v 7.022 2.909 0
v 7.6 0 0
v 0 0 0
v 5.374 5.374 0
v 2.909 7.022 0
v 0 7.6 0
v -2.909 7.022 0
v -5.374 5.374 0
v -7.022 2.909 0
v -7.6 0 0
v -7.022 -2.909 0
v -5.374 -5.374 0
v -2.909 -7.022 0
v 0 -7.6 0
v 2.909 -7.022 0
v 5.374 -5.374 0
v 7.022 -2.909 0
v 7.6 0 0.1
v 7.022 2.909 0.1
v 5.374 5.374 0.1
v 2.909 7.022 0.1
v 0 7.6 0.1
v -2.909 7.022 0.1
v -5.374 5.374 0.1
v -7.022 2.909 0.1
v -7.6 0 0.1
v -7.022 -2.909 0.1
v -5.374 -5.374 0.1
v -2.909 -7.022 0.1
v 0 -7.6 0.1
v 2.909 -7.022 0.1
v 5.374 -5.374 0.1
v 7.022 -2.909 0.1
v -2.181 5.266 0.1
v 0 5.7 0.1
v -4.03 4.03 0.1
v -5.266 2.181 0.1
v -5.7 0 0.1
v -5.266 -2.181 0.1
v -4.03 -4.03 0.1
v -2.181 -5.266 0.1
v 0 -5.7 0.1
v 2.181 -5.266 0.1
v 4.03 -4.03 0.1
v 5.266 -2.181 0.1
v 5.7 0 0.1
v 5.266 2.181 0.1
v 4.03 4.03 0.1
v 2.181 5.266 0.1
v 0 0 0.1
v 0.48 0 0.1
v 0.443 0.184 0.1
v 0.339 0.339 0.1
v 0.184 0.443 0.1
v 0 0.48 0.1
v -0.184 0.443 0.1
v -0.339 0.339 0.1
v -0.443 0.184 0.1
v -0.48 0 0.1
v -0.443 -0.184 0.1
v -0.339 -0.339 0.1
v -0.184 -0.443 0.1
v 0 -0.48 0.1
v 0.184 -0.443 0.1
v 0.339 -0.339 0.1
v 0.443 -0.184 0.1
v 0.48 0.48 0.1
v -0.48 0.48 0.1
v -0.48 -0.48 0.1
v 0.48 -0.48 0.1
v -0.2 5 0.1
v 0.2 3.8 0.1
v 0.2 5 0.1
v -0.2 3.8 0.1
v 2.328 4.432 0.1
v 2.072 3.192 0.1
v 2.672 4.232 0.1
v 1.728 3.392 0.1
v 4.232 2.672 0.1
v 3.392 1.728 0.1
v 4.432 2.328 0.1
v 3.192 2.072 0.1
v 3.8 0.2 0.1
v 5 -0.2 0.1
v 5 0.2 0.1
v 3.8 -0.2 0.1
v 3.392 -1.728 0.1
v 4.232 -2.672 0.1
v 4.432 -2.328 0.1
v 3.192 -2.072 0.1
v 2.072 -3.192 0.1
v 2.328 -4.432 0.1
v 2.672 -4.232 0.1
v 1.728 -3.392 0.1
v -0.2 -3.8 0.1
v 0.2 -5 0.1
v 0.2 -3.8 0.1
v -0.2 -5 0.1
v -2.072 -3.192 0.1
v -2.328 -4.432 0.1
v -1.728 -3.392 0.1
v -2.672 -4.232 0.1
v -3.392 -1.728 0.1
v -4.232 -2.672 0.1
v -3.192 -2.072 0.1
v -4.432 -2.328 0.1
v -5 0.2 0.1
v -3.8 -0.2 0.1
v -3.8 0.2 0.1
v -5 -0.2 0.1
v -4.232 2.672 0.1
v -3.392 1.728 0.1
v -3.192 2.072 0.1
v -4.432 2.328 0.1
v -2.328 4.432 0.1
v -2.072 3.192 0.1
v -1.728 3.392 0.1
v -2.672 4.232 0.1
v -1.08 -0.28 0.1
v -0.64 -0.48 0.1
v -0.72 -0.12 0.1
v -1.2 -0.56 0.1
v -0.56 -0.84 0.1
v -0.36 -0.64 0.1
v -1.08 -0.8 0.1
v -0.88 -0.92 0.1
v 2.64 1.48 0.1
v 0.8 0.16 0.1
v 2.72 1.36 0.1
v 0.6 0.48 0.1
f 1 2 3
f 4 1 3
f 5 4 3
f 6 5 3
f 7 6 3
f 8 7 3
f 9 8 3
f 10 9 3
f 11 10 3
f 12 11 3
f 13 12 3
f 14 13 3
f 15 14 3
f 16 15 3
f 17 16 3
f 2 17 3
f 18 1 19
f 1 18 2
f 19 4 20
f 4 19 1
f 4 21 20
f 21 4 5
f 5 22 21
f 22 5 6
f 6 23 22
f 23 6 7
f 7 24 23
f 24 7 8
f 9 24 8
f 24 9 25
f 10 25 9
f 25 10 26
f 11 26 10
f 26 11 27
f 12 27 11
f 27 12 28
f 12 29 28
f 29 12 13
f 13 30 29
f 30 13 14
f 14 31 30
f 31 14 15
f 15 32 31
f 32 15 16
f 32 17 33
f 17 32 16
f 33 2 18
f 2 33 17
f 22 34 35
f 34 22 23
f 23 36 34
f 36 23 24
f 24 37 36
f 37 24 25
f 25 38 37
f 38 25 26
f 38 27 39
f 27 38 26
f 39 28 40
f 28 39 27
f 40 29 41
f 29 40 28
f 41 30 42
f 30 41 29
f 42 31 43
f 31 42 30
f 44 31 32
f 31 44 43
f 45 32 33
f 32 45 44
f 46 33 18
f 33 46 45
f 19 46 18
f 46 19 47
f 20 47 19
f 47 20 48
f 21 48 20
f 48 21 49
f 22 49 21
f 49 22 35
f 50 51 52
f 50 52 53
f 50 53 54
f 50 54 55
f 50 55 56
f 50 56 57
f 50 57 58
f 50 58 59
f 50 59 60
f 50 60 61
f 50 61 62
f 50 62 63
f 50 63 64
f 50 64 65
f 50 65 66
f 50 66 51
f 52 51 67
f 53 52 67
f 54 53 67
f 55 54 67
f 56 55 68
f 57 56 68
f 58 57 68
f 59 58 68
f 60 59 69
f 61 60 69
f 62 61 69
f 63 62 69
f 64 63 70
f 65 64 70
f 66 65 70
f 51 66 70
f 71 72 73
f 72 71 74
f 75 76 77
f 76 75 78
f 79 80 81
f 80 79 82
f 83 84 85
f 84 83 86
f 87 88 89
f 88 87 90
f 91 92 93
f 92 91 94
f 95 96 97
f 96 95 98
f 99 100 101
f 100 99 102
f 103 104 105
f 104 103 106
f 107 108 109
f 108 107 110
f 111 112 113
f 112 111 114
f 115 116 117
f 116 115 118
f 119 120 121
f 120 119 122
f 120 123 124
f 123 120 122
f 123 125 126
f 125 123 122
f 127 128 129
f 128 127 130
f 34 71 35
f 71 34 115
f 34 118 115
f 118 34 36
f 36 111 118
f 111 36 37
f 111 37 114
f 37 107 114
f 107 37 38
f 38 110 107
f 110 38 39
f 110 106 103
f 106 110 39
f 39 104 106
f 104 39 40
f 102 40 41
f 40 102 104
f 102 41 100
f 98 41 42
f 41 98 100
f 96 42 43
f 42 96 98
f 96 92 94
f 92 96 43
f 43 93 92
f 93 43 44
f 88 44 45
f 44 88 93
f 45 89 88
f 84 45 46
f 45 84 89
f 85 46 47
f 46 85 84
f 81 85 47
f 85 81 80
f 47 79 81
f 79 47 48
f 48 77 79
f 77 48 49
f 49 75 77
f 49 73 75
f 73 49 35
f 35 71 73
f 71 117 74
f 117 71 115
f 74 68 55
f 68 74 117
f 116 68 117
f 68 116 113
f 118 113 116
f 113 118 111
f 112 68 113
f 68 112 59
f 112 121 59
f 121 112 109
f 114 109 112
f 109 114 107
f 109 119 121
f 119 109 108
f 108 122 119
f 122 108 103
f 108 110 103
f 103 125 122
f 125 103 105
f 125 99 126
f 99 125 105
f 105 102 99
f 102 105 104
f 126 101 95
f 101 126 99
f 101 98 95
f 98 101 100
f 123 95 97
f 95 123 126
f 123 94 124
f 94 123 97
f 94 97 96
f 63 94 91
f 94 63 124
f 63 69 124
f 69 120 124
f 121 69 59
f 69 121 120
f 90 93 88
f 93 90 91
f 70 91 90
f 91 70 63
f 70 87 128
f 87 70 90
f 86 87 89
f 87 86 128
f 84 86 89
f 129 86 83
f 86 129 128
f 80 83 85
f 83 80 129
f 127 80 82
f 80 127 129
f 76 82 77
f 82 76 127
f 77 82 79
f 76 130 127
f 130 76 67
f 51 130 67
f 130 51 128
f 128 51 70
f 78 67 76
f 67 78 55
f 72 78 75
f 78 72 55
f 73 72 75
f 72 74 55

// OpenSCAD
// file: ../p/empty.scad
use <../lib.scad>
function ldraw_lib__empty() = [
// 0 Empty
// 0 Name: empty.dat
// 0 Author: Steffen [Steffen]
// 0 !LDRAW_ORG Primitive UPDATE 2015-01
// 0 !LICENSE Licensed under CC BY 4.0 : see CAreadme.txt
// 
// 0 BFC CERTIFY CCW
  [0,"BFC","CERTIFY"],
  [0,"BFC","CCW"],
// 
// 0 !HISTORY 2015-10-11 [PTadmin] Official Update 2015-01
// 
// 
// 0 // Tool MLCad cannot handle really empty files. This file is used as a workaround.
// 0 // It exceptionally contains forbidden non-LDRAW standard syntax to satisfy MLCad until it is fixed OR a different editor has become the de-facto LDRAW standard.
// 0 // The line being used here is an "impossible" conditional line which never should be visible,
// 0 // additionally hidden by a syntax explicitly hiding it from displaying.
// 
// 0 MLCAD HIDE 5 24 0 0 0 0.0001 0 0 0.0001 -0.0001 0 0 0 0
];
module ldraw_lib__empty(step=0, col=false, unit=2/5, alt=false, line=0.2, solid=!$preview)
    makepoly(ldraw_lib__empty(), step=step, col=col, unit=unit, alt=alt, line=line, solid=solid);
ldraw_lib__empty(line=0.2);
// file: ../p/1-16chrd.scad
use <../lib.scad>
use <empty.scad>
function ldraw_lib__1_16chrd() = [
// 0 Chord 0.0625
// 0 Name: 1-16chrd.dat
// 0 Author: Philippe Hurbain [Philo]
// 0 !LDRAW_ORG Primitive UPDATE 2015-01
// 0 !LICENSE Licensed under CC BY 4.0 : see CAreadme.txt
// 
// 0 BFC CERTIFY CCW
  [0,"BFC","CERTIFY"],
  [0,"BFC","CCW"],
// 
// 0 !HISTORY 2015-10-11 [PTadmin] Official Update 2015-01
// 
// 
// 0 // This file is intentionally empty because at the current \P resolution,
// 0 // an 1-16chrd is actually empty. However, this file still is present
// 0 // to allow tools to do primitives substition and fill in a real chrd here,
// 0 // or, if desired, to substitute this with the hi-res 48\1-16chrd.
// 
// 0 // This file is based on an idea by Darats at http://forums.ldraw.org/read.php?19,14500,14500#msg-14500
// 
// 1 16 0 0 0 1 0 0 0 1 0 0 0 1 empty.dat
  [1,16,0,0,0,1,0,0,0,1,0,0,0,1, ldraw_lib__empty()],
];
module ldraw_lib__1_16chrd(step=0, col=false, unit=2/5, alt=false, line=0.2, solid=!$preview)
    makepoly(ldraw_lib__1_16chrd(), step=step, col=col, unit=unit, alt=alt, line=line, solid=solid);
ldraw_lib__1_16chrd(line=0.2);
// file: ../p/4-4cyli.scad
use <../lib.scad>
function ldraw_lib__4_4cyli() = [
// 0 Cylinder 1.0
// 0 Name: 4-4cyli.dat
// 0 Author: James Jessiman
// 0 !LDRAW_ORG Primitive UPDATE 2005-01
// 0 !LICENSE Licensed under CC BY 4.0 : see CAreadme.txt
// 
// 0 BFC CERTIFY CCW
  [0,"BFC","CERTIFY"],
  [0,"BFC","CCW"],
// 
// 0 !HISTORY 1998-12-15 [PTadmin] Official Update 1998-10
// 0 !HISTORY 2002-03-23 [sbliss] Added BFC statement; merged headers from files in distributions LDraw 0.27 and Complete.
// 0 !HISTORY 2002-04-25 [PTadmin] Official Update 2002-02
// 0 !HISTORY 2004-12-14 [guyvivan] BFC CCW
// 0 !HISTORY 2005-12-28 [PTadmin] Official Update 2005-01
// 0 !HISTORY 2007-06-24 [PTadmin] Header formatted for Contributor Agreement
// 0 !HISTORY 2008-07-01 [PTadmin] Official Update 2008-01
// 
// 
// 4 16 1 1 0 0.9239 1 0.3827 0.9239 0 0.3827 1 0 0
  [4,16,1,1,0,0.9239,1,0.3827,0.9239,0,0.3827,1,0,0],
// 5 24 1 0 0 1 1 0 0.9239 0 0.3827 0.9239 0 -0.3827
  [5,24,1,0,0,1,1,0,0.9239,0,0.3827,0.9239,0,-0.3827],
// 4 16 0.9239 1 0.3827 0.7071 1 0.7071 0.7071 0 0.7071 0.9239 0 0.3827
  [4,16,0.9239,1,0.3827,0.7071,1,0.7071,0.7071,0,0.7071,0.9239,0,0.3827],
// 5 24 0.9239 0 0.3827 0.9239 1 0.3827 0.7071 0 0.7071 1 0 0
  [5,24,0.9239,0,0.3827,0.9239,1,0.3827,0.7071,0,0.7071,1,0,0],
// 4 16 0.7071 1 0.7071 0.3827 1 0.9239 0.3827 0 0.9239 0.7071 0 0.7071
  [4,16,0.7071,1,0.7071,0.3827,1,0.9239,0.3827,0,0.9239,0.7071,0,0.7071],
// 5 24 0.7071 0 0.7071 0.7071 1 0.7071 0.3827 0 0.9239 0.9239 0 0.3827
  [5,24,0.7071,0,0.7071,0.7071,1,0.7071,0.3827,0,0.9239,0.9239,0,0.3827],
// 4 16 0.3827 1 0.9239 0 1 1 0 0 1 0.3827 0 0.9239
  [4,16,0.3827,1,0.9239,0,1,1,0,0,1,0.3827,0,0.9239],
// 5 24 0.3827 0 0.9239 0.3827 1 0.9239 0 0 1 0.7071 0 0.7071
  [5,24,0.3827,0,0.9239,0.3827,1,0.9239,0,0,1,0.7071,0,0.7071],
// 4 16 0 1 1 -0.3827 1 0.9239 -0.3827 0 0.9239 0 0 1
  [4,16,0,1,1,-0.3827,1,0.9239,-0.3827,0,0.9239,0,0,1],
// 5 24 0 0 1 0 1 1 -0.3827 0 0.9239 0.3827 0 0.9239
  [5,24,0,0,1,0,1,1,-0.3827,0,0.9239,0.3827,0,0.9239],
// 4 16 -0.3827 1 0.9239 -0.7071 1 0.7071 -0.7071 0 0.7071 -0.3827 0 0.9239
  [4,16,-0.3827,1,0.9239,-0.7071,1,0.7071,-0.7071,0,0.7071,-0.3827,0,0.9239],
// 5 24 -0.3827 0 0.9239 -0.3827 1 0.9239 -0.7071 0 0.7071 0 0 1
  [5,24,-0.3827,0,0.9239,-0.3827,1,0.9239,-0.7071,0,0.7071,0,0,1],
// 4 16 -0.7071 1 0.7071 -0.9239 1 0.3827 -0.9239 0 0.3827 -0.7071 0 0.7071
  [4,16,-0.7071,1,0.7071,-0.9239,1,0.3827,-0.9239,0,0.3827,-0.7071,0,0.7071],
// 5 24 -0.7071 0 0.7071 -0.7071 1 0.7071 -0.9239 0 0.3827 -0.3827 0 0.9239
  [5,24,-0.7071,0,0.7071,-0.7071,1,0.7071,-0.9239,0,0.3827,-0.3827,0,0.9239],
// 4 16 -0.9239 1 0.3827 -1 1 0 -1 0 0 -0.9239 0 0.3827
  [4,16,-0.9239,1,0.3827,-1,1,0,-1,0,0,-0.9239,0,0.3827],
// 5 24 -0.9239 0 0.3827 -0.9239 1 0.3827 -1 0 0 -0.7071 0 0.7071
  [5,24,-0.9239,0,0.3827,-0.9239,1,0.3827,-1,0,0,-0.7071,0,0.7071],
// 4 16 -1 1 0 -0.9239 1 -0.3827 -0.9239 0 -0.3827 -1 0 0
  [4,16,-1,1,0,-0.9239,1,-0.3827,-0.9239,0,-0.3827,-1,0,0],
// 5 24 -1 0 0 -1 1 0 -0.9239 0 -0.3827 -0.9239 0 0.3827
  [5,24,-1,0,0,-1,1,0,-0.9239,0,-0.3827,-0.9239,0,0.3827],
// 4 16 -0.9239 1 -0.3827 -0.7071 1 -0.7071 -0.7071 0 -0.7071 -0.9239 0 -0.3827
  [4,16,-0.9239,1,-0.3827,-0.7071,1,-0.7071,-0.7071,0,-0.7071,-0.9239,0,-0.3827],
// 5 24 -0.9239 0 -0.3827 -0.9239 1 -0.3827 -0.7071 0 -0.7071 -1 0 0
  [5,24,-0.9239,0,-0.3827,-0.9239,1,-0.3827,-0.7071,0,-0.7071,-1,0,0],
// 4 16 -0.7071 1 -0.7071 -0.3827 1 -0.9239 -0.3827 0 -0.9239 -0.7071 0 -0.7071
  [4,16,-0.7071,1,-0.7071,-0.3827,1,-0.9239,-0.3827,0,-0.9239,-0.7071,0,-0.7071],
// 5 24 -0.7071 0 -0.7071 -0.7071 1 -0.7071 -0.3827 0 -0.9239 -0.9239 0 -0.3827
  [5,24,-0.7071,0,-0.7071,-0.7071,1,-0.7071,-0.3827,0,-0.9239,-0.9239,0,-0.3827],
// 4 16 -0.3827 1 -0.9239 0 1 -1 0 0 -1 -0.3827 0 -0.9239
  [4,16,-0.3827,1,-0.9239,0,1,-1,0,0,-1,-0.3827,0,-0.9239],
// 5 24 -0.3827 0 -0.9239 -0.3827 1 -0.9239 0 0 -1 -0.7071 0 -0.7071
  [5,24,-0.3827,0,-0.9239,-0.3827,1,-0.9239,0,0,-1,-0.7071,0,-0.7071],
// 4 16 0 1 -1 0.3827 1 -0.9239 0.3827 0 -0.9239 0 0 -1
  [4,16,0,1,-1,0.3827,1,-0.9239,0.3827,0,-0.9239,0,0,-1],
// 5 24 0 0 -1 0 1 -1 0.3827 0 -0.9239 -0.3827 0 -0.9239
  [5,24,0,0,-1,0,1,-1,0.3827,0,-0.9239,-0.3827,0,-0.9239],
// 4 16 0.3827 1 -0.9239 0.7071 1 -0.7071 0.7071 0 -0.7071 0.3827 0 -0.9239
  [4,16,0.3827,1,-0.9239,0.7071,1,-0.7071,0.7071,0,-0.7071,0.3827,0,-0.9239],
// 5 24 0.3827 0 -0.9239 0.3827 1 -0.9239 0.7071 0 -0.7071 0 0 -1
  [5,24,0.3827,0,-0.9239,0.3827,1,-0.9239,0.7071,0,-0.7071,0,0,-1],
// 4 16 0.7071 1 -0.7071 0.9239 1 -0.3827 0.9239 0 -0.3827 0.7071 0 -0.7071
  [4,16,0.7071,1,-0.7071,0.9239,1,-0.3827,0.9239,0,-0.3827,0.7071,0,-0.7071],
// 5 24 0.7071 0 -0.7071 0.7071 1 -0.7071 0.9239 0 -0.3827 0.3827 0 -0.9239
  [5,24,0.7071,0,-0.7071,0.7071,1,-0.7071,0.9239,0,-0.3827,0.3827,0,-0.9239],
// 4 16 0.9239 1 -0.3827 1 1 0 1 0 0 0.9239 0 -0.3827
  [4,16,0.9239,1,-0.3827,1,1,0,1,0,0,0.9239,0,-0.3827],
// 5 24 0.9239 0 -0.3827 0.9239 1 -0.3827 1 0 0 0.7071 0 -0.7071
  [5,24,0.9239,0,-0.3827,0.9239,1,-0.3827,1,0,0,0.7071,0,-0.7071],
// 0
];
module ldraw_lib__4_4cyli(step=0, col=false, unit=2/5, alt=false, line=0.2, solid=!$preview)
    makepoly(ldraw_lib__4_4cyli(), step=step, col=col, unit=unit, alt=alt, line=line, solid=solid);
ldraw_lib__4_4cyli(line=0.2);
// file: ../p/4-4ring3.scad
use <../lib.scad>
function ldraw_lib__4_4ring3() = [
// 0 Ring  3 x 1.0
// 0 Name: 4-4ring3.dat
// 0 Author: James Jessiman
// 0 !LDRAW_ORG Primitive UPDATE 2009-01
// 0 !LICENSE Licensed under CC BY 4.0 : see CAreadme.txt
// 
// 0 BFC CERTIFY CCW
  [0,"BFC","CERTIFY"],
  [0,"BFC","CCW"],
// 
// 0 !HISTORY 1998-12-15 [PTadmin] Official Update 1998-10
// 0 !HISTORY 2002-04-05 [hafhead] Added BFC statement
// 0 !HISTORY 2002-04-25 [PTadmin] Official Update 2002-02
// 0 !HISTORY 2007-06-24 [PTadmin] Header formatted for Contributor Agreement
// 0 !HISTORY 2008-07-01 [PTadmin] Official Update 2008-01
// 0 !HISTORY 2008-08-26 [cwdee] Switch polygon winding and rename
// 0 !HISTORY 2009-05-02 [PTadmin] Official Update 2009-01
// 
// 
// 4 16 -1.5308 0 3.6956 -1.1481 0 2.7717 0 0 3 0 0 4
  [4,16,-1.5308,0,3.6956,-1.1481,0,2.7717,0,0,3,0,0,4],
// 4 16 -2.8284 0 2.8284 -2.1213 0 2.1213 -1.1481 0 2.7717 -1.5308 0 3.6956
  [4,16,-2.8284,0,2.8284,-2.1213,0,2.1213,-1.1481,0,2.7717,-1.5308,0,3.6956],
// 4 16 -3.6956 0 1.5308 -2.7717 0 1.1481 -2.1213 0 2.1213 -2.8284 0 2.8284
  [4,16,-3.6956,0,1.5308,-2.7717,0,1.1481,-2.1213,0,2.1213,-2.8284,0,2.8284],
// 4 16 -4 0 0 -3 0 0 -2.7717 0 1.1481 -3.6956 0 1.5308
  [4,16,-4,0,0,-3,0,0,-2.7717,0,1.1481,-3.6956,0,1.5308],
// 4 16 -3.6956 0 -1.5308 -2.7717 0 -1.1481 -3 0 0 -4 0 0
  [4,16,-3.6956,0,-1.5308,-2.7717,0,-1.1481,-3,0,0,-4,0,0],
// 4 16 -2.8284 0 -2.8284 -2.1213 0 -2.1213 -2.7717 0 -1.1481 -3.6956 0 -1.5308
  [4,16,-2.8284,0,-2.8284,-2.1213,0,-2.1213,-2.7717,0,-1.1481,-3.6956,0,-1.5308],
// 4 16 -1.5308 0 -3.6956 -1.1481 0 -2.7717 -2.1213 0 -2.1213 -2.8284 0 -2.8284
  [4,16,-1.5308,0,-3.6956,-1.1481,0,-2.7717,-2.1213,0,-2.1213,-2.8284,0,-2.8284],
// 4 16 0 0 -4 0 0 -3 -1.1481 0 -2.7717 -1.5308 0 -3.6956
  [4,16,0,0,-4,0,0,-3,-1.1481,0,-2.7717,-1.5308,0,-3.6956],
// 4 16 1.5308 0 -3.6956 1.1481 0 -2.7717 0 0 -3 0 0 -4
  [4,16,1.5308,0,-3.6956,1.1481,0,-2.7717,0,0,-3,0,0,-4],
// 4 16 2.8284 0 -2.8284 2.1213 0 -2.1213 1.1481 0 -2.7717 1.5308 0 -3.6956
  [4,16,2.8284,0,-2.8284,2.1213,0,-2.1213,1.1481,0,-2.7717,1.5308,0,-3.6956],
// 4 16 3.6956 0 -1.5308 2.7717 0 -1.1481 2.1213 0 -2.1213 2.8284 0 -2.8284
  [4,16,3.6956,0,-1.5308,2.7717,0,-1.1481,2.1213,0,-2.1213,2.8284,0,-2.8284],
// 4 16 4 0 0 3 0 0 2.7717 0 -1.1481 3.6956 0 -1.5308
  [4,16,4,0,0,3,0,0,2.7717,0,-1.1481,3.6956,0,-1.5308],
// 4 16 3.6956 0 1.5308 2.7717 0 1.1481 3 0 0 4 0 0
  [4,16,3.6956,0,1.5308,2.7717,0,1.1481,3,0,0,4,0,0],
// 4 16 2.8284 0 2.8284 2.1213 0 2.1213 2.7717 0 1.1481 3.6956 0 1.5308
  [4,16,2.8284,0,2.8284,2.1213,0,2.1213,2.7717,0,1.1481,3.6956,0,1.5308],
// 4 16 1.5308 0 3.6956 1.1481 0 2.7717 2.1213 0 2.1213 2.8284 0 2.8284
  [4,16,1.5308,0,3.6956,1.1481,0,2.7717,2.1213,0,2.1213,2.8284,0,2.8284],
// 4 16 0 0 4 0 0 3 1.1481 0 2.7717 1.5308 0 3.6956
  [4,16,0,0,4,0,0,3,1.1481,0,2.7717,1.5308,0,3.6956],
// 0
];
module ldraw_lib__4_4ring3(step=0, col=false, unit=2/5, alt=false, line=0.2, solid=!$preview)
    makepoly(ldraw_lib__4_4ring3(), step=step, col=col, unit=unit, alt=alt, line=line, solid=solid);
ldraw_lib__4_4ring3(line=0.2);
// file: ../p/4-4ndis.scad
use <../lib.scad>
function ldraw_lib__4_4ndis() = [
// 0 Disc Negative 1.0
// 0 Name: 4-4ndis.dat
// 0 Author: James Jessiman
// 0 !LDRAW_ORG Primitive UPDATE 2012-01
// 0 !LICENSE Licensed under CC BY 4.0 : see CAreadme.txt
// 
// 0 BFC CERTIFY CCW
  [0,"BFC","CERTIFY"],
  [0,"BFC","CCW"],
// 
// 0 !HISTORY 2002-03-23 [sbliss] Added BFC statement; compacted code
// 0 !HISTORY 2002-04-25 [PTadmin] Official Update 2002-02
// 0 !HISTORY 2007-06-24 [PTadmin] Header formatted for Contributor Agreement
// 0 !HISTORY 2008-07-01 [PTadmin] Official Update 2008-01
// 0 !HISTORY 2012-02-16 [Philo] Changed to CCW
// 0 !HISTORY 2012-03-30 [PTadmin] Official Update 2012-01
// 
// 
// 3 16 0.9239 0 0.3827 1 0 0 1 0 1
  [3,16,0.9239,0,0.3827,1,0,0,1,0,1],
// 3 16 0.7071 0 0.7071 0.9239 0 0.3827 1 0 1
  [3,16,0.7071,0,0.7071,0.9239,0,0.3827,1,0,1],
// 3 16 0.3827 0 0.9239 0.7071 0 0.7071 1 0 1
  [3,16,0.3827,0,0.9239,0.7071,0,0.7071,1,0,1],
// 3 16 0 0 1 0.3827 0 0.9239 1 0 1
  [3,16,0,0,1,0.3827,0,0.9239,1,0,1],
// 3 16 -0.3827 0 0.9239 0 0 1 -1 0 1
  [3,16,-0.3827,0,0.9239,0,0,1,-1,0,1],
// 3 16 -0.7071 0 0.7071 -0.3827 0 0.9239 -1 0 1
  [3,16,-0.7071,0,0.7071,-0.3827,0,0.9239,-1,0,1],
// 3 16 -0.9239 0 0.3827 -0.7071 0 0.7071 -1 0 1
  [3,16,-0.9239,0,0.3827,-0.7071,0,0.7071,-1,0,1],
// 3 16 -1 0 0 -0.9239 0 0.3827 -1 0 1
  [3,16,-1,0,0,-0.9239,0,0.3827,-1,0,1],
// 3 16 -0.9239 0 -0.3827 -1 0 0 -1 0 -1
  [3,16,-0.9239,0,-0.3827,-1,0,0,-1,0,-1],
// 3 16 -0.7071 0 -0.7071 -0.9239 0 -0.3827 -1 0 -1
  [3,16,-0.7071,0,-0.7071,-0.9239,0,-0.3827,-1,0,-1],
// 3 16 -0.3827 0 -0.9239 -0.7071 0 -0.7071 -1 0 -1
  [3,16,-0.3827,0,-0.9239,-0.7071,0,-0.7071,-1,0,-1],
// 3 16 0 0 -1 -0.3827 0 -0.9239 -1 0 -1
  [3,16,0,0,-1,-0.3827,0,-0.9239,-1,0,-1],
// 3 16 0.3827 0 -0.9239 0 0 -1 1 0 -1
  [3,16,0.3827,0,-0.9239,0,0,-1,1,0,-1],
// 3 16 0.7071 0 -0.7071 0.3827 0 -0.9239 1 0 -1
  [3,16,0.7071,0,-0.7071,0.3827,0,-0.9239,1,0,-1],
// 3 16 0.9239 0 -0.3827 0.7071 0 -0.7071 1 0 -1
  [3,16,0.9239,0,-0.3827,0.7071,0,-0.7071,1,0,-1],
// 3 16 1 0 0 0.9239 0 -0.3827 1 0 -1
  [3,16,1,0,0,0.9239,0,-0.3827,1,0,-1],
];
module ldraw_lib__4_4ndis(step=0, col=false, unit=2/5, alt=false, line=0.2, solid=!$preview)
    makepoly(ldraw_lib__4_4ndis(), step=step, col=col, unit=unit, alt=alt, line=line, solid=solid);
ldraw_lib__4_4ndis(line=0.2);
// file: ../p/4-4ering.scad
use <../lib.scad>
use <1-16chrd.scad>
function ldraw_lib__4_4ering() = [
// 0 Adapter Ring Triangles to Normal 1.0
// 0 Name: 4-4ering.dat
// 0 Author: Philippe Hurbain [Philo]
// 0 !LDRAW_ORG Primitive UPDATE 2015-01
// 0 !LICENSE Licensed under CC BY 4.0 : see CAreadme.txt
// 
// 0 BFC CERTIFY CCW
  [0,"BFC","CERTIFY"],
  [0,"BFC","CCW"],
// 
// 0 !HISTORY 2015-10-11 [PTadmin] Official Update 2015-01
// 
// 
// 0 // This file uses 1-16chrd (actually empty). It allows
// 0 // tools to do primitives substition and fill in a ring of chrd here,
// 0 // or, if desired, to substitute this with the hi-res 48\1-16chrd.
// 0 // This file is based on an idea by Darats at http://forums.ldraw.org/read.php?19,14500,14500#msg-14500
// 
// 1 16 0 0 0 1 0 0 0 1 0 0 0 1 1-16chrd.dat
  [1,16,0,0,0,1,0,0,0,1,0,0,0,1, ldraw_lib__1_16chrd()],
// 1 16 0 0 0 0.92388 0 0.38268 0 1 0 -0.38268 0 0.92388 1-16chrd.dat
  [1,16,0,0,0,0.92388,0,0.38268,0,1,0,-0.38268,0,0.92388, ldraw_lib__1_16chrd()],
// 1 16 0 0 0 0.70711 0 0.70711 0 1 0 -0.70711 0 0.70711 1-16chrd.dat
  [1,16,0,0,0,0.70711,0,0.70711,0,1,0,-0.70711,0,0.70711, ldraw_lib__1_16chrd()],
// 1 16 0 0 0 0.38268 0 0.92388 0 1 0 -0.92388 0 0.38268 1-16chrd.dat
  [1,16,0,0,0,0.38268,0,0.92388,0,1,0,-0.92388,0,0.38268, ldraw_lib__1_16chrd()],
// 1 16 0 0 0 0 0 1 0 1 0 -1 0 0 1-16chrd.dat
  [1,16,0,0,0,0,0,1,0,1,0,-1,0,0, ldraw_lib__1_16chrd()],
// 1 16 0 0 0 -0.38268 0 0.92388 0 1 0 -0.92388 0 -0.38268 1-16chrd.dat
  [1,16,0,0,0,-0.38268,0,0.92388,0,1,0,-0.92388,0,-0.38268, ldraw_lib__1_16chrd()],
// 1 16 0 0 0 -0.70711 0 0.70711 0 1 0 -0.70711 0 -0.70711 1-16chrd.dat
  [1,16,0,0,0,-0.70711,0,0.70711,0,1,0,-0.70711,0,-0.70711, ldraw_lib__1_16chrd()],
// 1 16 0 0 0 -0.92388 0 0.38268 0 1 0 -0.38268 0 -0.92388 1-16chrd.dat
  [1,16,0,0,0,-0.92388,0,0.38268,0,1,0,-0.38268,0,-0.92388, ldraw_lib__1_16chrd()],
// 1 16 0 0 0 0 0 -1 0 1 0 1 0 0 1-16chrd.dat
  [1,16,0,0,0,0,0,-1,0,1,0,1,0,0, ldraw_lib__1_16chrd()],
// 1 16 0 0 0 0.38268 0 -0.92388 0 1 0 0.92388 0 0.38268 1-16chrd.dat
  [1,16,0,0,0,0.38268,0,-0.92388,0,1,0,0.92388,0,0.38268, ldraw_lib__1_16chrd()],
// 1 16 0 0 0 0.70711 0 -0.70711 0 1 0 0.70711 0 0.70711 1-16chrd.dat
  [1,16,0,0,0,0.70711,0,-0.70711,0,1,0,0.70711,0,0.70711, ldraw_lib__1_16chrd()],
// 1 16 0 0 0 0.92388 0 -0.38268 0 1 0 0.38268 0 0.92388 1-16chrd.dat
  [1,16,0,0,0,0.92388,0,-0.38268,0,1,0,0.38268,0,0.92388, ldraw_lib__1_16chrd()],
// 1 16 0 0 0 -1 0 0 0 1 0 0 0 -1 1-16chrd.dat
  [1,16,0,0,0,-1,0,0,0,1,0,0,0,-1, ldraw_lib__1_16chrd()],
// 1 16 0 0 0 -0.92388 0 -0.38268 0 1 0 0.38268 0 -0.92388 1-16chrd.dat
  [1,16,0,0,0,-0.92388,0,-0.38268,0,1,0,0.38268,0,-0.92388, ldraw_lib__1_16chrd()],
// 1 16 0 0 0 -0.70711 0 -0.70711 0 1 0 0.70711 0 -0.70711 1-16chrd.dat
  [1,16,0,0,0,-0.70711,0,-0.70711,0,1,0,0.70711,0,-0.70711, ldraw_lib__1_16chrd()],
// 1 16 0 0 0 -0.38268 0 -0.92388 0 1 0 0.92388 0 -0.38268 1-16chrd.dat
  [1,16,0,0,0,-0.38268,0,-0.92388,0,1,0,0.92388,0,-0.38268, ldraw_lib__1_16chrd()],
];
module ldraw_lib__4_4ering(step=0, col=false, unit=2/5, alt=false, line=0.2, solid=!$preview)
    makepoly(ldraw_lib__4_4ering(), step=step, col=col, unit=unit, alt=alt, line=line, solid=solid);
ldraw_lib__4_4ering(line=0.2);
// file: ../p/4-4disc.scad
use <../lib.scad>
function ldraw_lib__4_4disc() = [
// 0 Disc 1.0
// 0 Name: 4-4disc.dat
// 0 Author: James Jessiman
// 0 !LDRAW_ORG Primitive UPDATE 2002-02
// 0 !LICENSE Licensed under CC BY 4.0 : see CAreadme.txt
// 
// 0 BFC CERTIFY CCW
  [0,"BFC","CERTIFY"],
  [0,"BFC","CCW"],
// 
// 0 !HISTORY 1998-12-15 [PTadmin] Official Update 1998-10
// 0 !HISTORY 2002-03-23 [sbliss] Added BFC statement
// 0 !HISTORY 2002-04-25 [PTadmin] Official Update 2002-02
// 0 !HISTORY 2007-06-24 [PTadmin] Header formatted for Contributor Agreement
// 0 !HISTORY 2008-07-01 [PTadmin] Official Update 2008-01
// 
// 
// 3 16 0 0 0 1 0 0 0.9239 0 0.3827
  [3,16,0,0,0,1,0,0,0.9239,0,0.3827],
// 3 16 0 0 0 0.9239 0 0.3827 0.7071 0 0.7071
  [3,16,0,0,0,0.9239,0,0.3827,0.7071,0,0.7071],
// 3 16 0 0 0 0.7071 0 0.7071 0.3827 0 0.9239
  [3,16,0,0,0,0.7071,0,0.7071,0.3827,0,0.9239],
// 3 16 0 0 0 0.3827 0 0.9239 0 0 1
  [3,16,0,0,0,0.3827,0,0.9239,0,0,1],
// 3 16 0 0 0 0 0 1 -0.3827 0 0.9239
  [3,16,0,0,0,0,0,1,-0.3827,0,0.9239],
// 3 16 0 0 0 -0.3827 0 0.9239 -0.7071 0 0.7071
  [3,16,0,0,0,-0.3827,0,0.9239,-0.7071,0,0.7071],
// 3 16 0 0 0 -0.7071 0 0.7071 -0.9239 0 0.3827
  [3,16,0,0,0,-0.7071,0,0.7071,-0.9239,0,0.3827],
// 3 16 0 0 0 -0.9239 0 0.3827 -1 0 -0
  [3,16,0,0,0,-0.9239,0,0.3827,-1,0,-0],
// 3 16 0 0 0 -1 0 -0 -0.9239 0 -0.3827
  [3,16,0,0,0,-1,0,-0,-0.9239,0,-0.3827],
// 3 16 0 0 0 -0.9239 0 -0.3827 -0.7071 0 -0.7071
  [3,16,0,0,0,-0.9239,0,-0.3827,-0.7071,0,-0.7071],
// 3 16 0 0 0 -0.7071 0 -0.7071 -0.3827 0 -0.9239
  [3,16,0,0,0,-0.7071,0,-0.7071,-0.3827,0,-0.9239],
// 3 16 0 0 0 -0.3827 0 -0.9239 0 0 -1
  [3,16,0,0,0,-0.3827,0,-0.9239,0,0,-1],
// 3 16 0 0 0 0 0 -1 0.3827 0 -0.9239
  [3,16,0,0,0,0,0,-1,0.3827,0,-0.9239],
// 3 16 0 0 0 0.3827 0 -0.9239 0.7071 0 -0.7071
  [3,16,0,0,0,0.3827,0,-0.9239,0.7071,0,-0.7071],
// 3 16 0 0 0 0.7071 0 -0.7071 0.9239 0 -0.3827
  [3,16,0,0,0,0.7071,0,-0.7071,0.9239,0,-0.3827],
// 3 16 0 0 0 0.9239 0 -0.3827 1 0 0
  [3,16,0,0,0,0.9239,0,-0.3827,1,0,0],
// 0
];
module ldraw_lib__4_4disc(step=0, col=false, unit=2/5, alt=false, line=0.2, solid=!$preview)
    makepoly(ldraw_lib__4_4disc(), step=step, col=col, unit=unit, alt=alt, line=line, solid=solid);
ldraw_lib__4_4disc(line=0.2);
// file: ../p/4-4cylc3.scad
use <../lib.scad>
use <4-4cyli.scad>
use <4-4disc.scad>
function ldraw_lib__4_4cylc3() = [
// 0 Cylinder Closed 1.0 without Top or Bottom Edge Lines
// 0 Name: 4-4cylc3.dat
// 0 Author: Chris Dee [cwdee]
// 0 !LDRAW_ORG Primitive UPDATE 2017-01
// 0 !LICENSE Licensed under CC BY 4.0 : see CAreadme.txt
// 
// 0 BFC CERTIFY CCW
  [0,"BFC","CERTIFY"],
  [0,"BFC","CCW"],
// 
// 0 !HISTORY 2017-12-30 [PTadmin] Official Update 2017-01
// 
// 
// 1 16 0 0 0 1 0 0 0 1 0 0 0 1 4-4disc.dat
  [1,16,0,0,0,1,0,0,0,1,0,0,0,1, ldraw_lib__4_4disc()],
// 1 16 0 0 0 1 0 0 0 1 0 0 0 1 4-4cyli.dat
  [1,16,0,0,0,1,0,0,0,1,0,0,0,1, ldraw_lib__4_4cyli()],
// 0
];
module ldraw_lib__4_4cylc3(step=0, col=false, unit=2/5, alt=false, line=0.2, solid=!$preview)
    makepoly(ldraw_lib__4_4cylc3(), step=step, col=col, unit=unit, alt=alt, line=line, solid=solid);
ldraw_lib__4_4cylc3(line=0.2);
// main file
use <../lib.scad>
use <../p/4-4cylc3.scad>
use <../p/4-4disc.scad>
use <../p/4-4ering.scad>
use <../p/4-4ndis.scad>
use <../p/4-4ring3.scad>
function ldraw_lib__4650852m() = [
// 0 Sticker  1.9 x  1.9 Round with Dark Pink Scale with Lime Pointer in Medium Azure Circle
// 0 Name: 4650852m.dat
// 0 Author: Takeshi Takahashi [RainbowDolphin]
// 0 !LDRAW_ORG Part UPDATE 2024-08
// 0 !LICENSE Licensed under CC BY 4.0 : see CAreadme.txt
// 
// 0 BFC CERTIFY CCW
  [0,"BFC","CERTIFY"],
  [0,"BFC","CCW"],
// 
// 0 !KEYWORDS Set 3188, Vet, Weight Scale
// 
// 0 !HISTORY 2024-09-30 [OrionP] Official Update 2024-08
// 
// 
// 1 16 0 0 0 19 0 0 0 -0.25 0 0 0 19 4-4cylc3.dat
  [1,16,0,0,0,19,0,0,0,-0.25,0,0,0,19, ldraw_lib__4_4cylc3()],
// 1 322 0 -0.25 0 4.75 0 0 0 1 0 0 0 4.75 4-4ring3.dat
  [1,322,0,-0.25,0,4.75,0,0,0,1,0,0,0,4.75, ldraw_lib__4_4ring3()],
// 1 15 0 -.25 0 14.25 0 0 0 1 0 0 0 14.25 4-4ering.dat
  [1,15,0,-.25,0,14.25,0,0,0,1,0,0,0,14.25, ldraw_lib__4_4ering()],
// 1 5 0 -0.25 0 1.2 0 0 0 1 0 0 0 1.2 4-4disc.dat
  [1,5,0,-0.25,0,1.2,0,0,0,1,0,0,0,1.2, ldraw_lib__4_4disc()],
// 1 15 0 -0.25 0 1.2 0 0 0 1 0 0 0 1.2 4-4ndis.dat
  [1,15,0,-0.25,0,1.2,0,0,0,1,0,0,0,1.2, ldraw_lib__4_4ndis()],
// 4 5 0.5 -0.25 12.5 -0.5 -0.25 12.5 -0.5 -0.25 9.5 0.5 -0.25 9.5
  [4,5,0.5,-0.25,12.5,-0.5,-0.25,12.5,-0.5,-0.25,9.5,0.5,-0.25,9.5],
// 4 5 6.68 -0.25 10.58 5.82 -0.25 11.08 4.32 -0.25 8.48 5.18 -0.25 7.98
  [4,5,6.68,-0.25,10.58,5.82,-0.25,11.08,4.32,-0.25,8.48,5.18,-0.25,7.98],
// 4 5 11.08 -0.25 5.82 10.58 -0.25 6.68 7.98 -0.25 5.18 8.48 -0.25 4.32
  [4,5,11.08,-0.25,5.82,10.58,-0.25,6.68,7.98,-0.25,5.18,8.48,-0.25,4.32],
// 4 5 12.5 -0.25 -0.5 12.5 -0.25 0.5 9.5 -0.25 0.5 9.5 -0.25 -0.5
  [4,5,12.5,-0.25,-0.5,12.5,-0.25,0.5,9.5,-0.25,0.5,9.5,-0.25,-0.5],
// 4 5 10.58 -0.25 -6.68 11.08 -0.25 -5.82 8.48 -0.25 -4.32 7.98 -0.25 -5.18
  [4,5,10.58,-0.25,-6.68,11.08,-0.25,-5.82,8.48,-0.25,-4.32,7.98,-0.25,-5.18],
// 4 5 5.82 -0.25 -11.08 6.68 -0.25 -10.58 5.18 -0.25 -7.98 4.32 -0.25 -8.48
  [4,5,5.82,-0.25,-11.08,6.68,-0.25,-10.58,5.18,-0.25,-7.98,4.32,-0.25,-8.48],
// 4 5 -0.5 -0.25 -12.5 0.5 -0.25 -12.5 0.5 -0.25 -9.5 -0.5 -0.25 -9.5
  [4,5,-0.5,-0.25,-12.5,0.5,-0.25,-12.5,0.5,-0.25,-9.5,-0.5,-0.25,-9.5],
// 4 5 -6.68 -0.25 -10.58 -5.82 -0.25 -11.08 -4.32 -0.25 -8.48 -5.18 -0.25 -7.98
  [4,5,-6.68,-0.25,-10.58,-5.82,-0.25,-11.08,-4.32,-0.25,-8.48,-5.18,-0.25,-7.98],
// 4 5 -11.08 -0.25 -5.82 -10.58 -0.25 -6.68 -7.98 -0.25 -5.18 -8.48 -0.25 -4.32
  [4,5,-11.08,-0.25,-5.82,-10.58,-0.25,-6.68,-7.98,-0.25,-5.18,-8.48,-0.25,-4.32],
// 4 5 -12.5 -0.25 0.5 -12.5 -0.25 -0.5 -9.5 -0.25 -0.5 -9.5 -0.25 0.5
  [4,5,-12.5,-0.25,0.5,-12.5,-0.25,-0.5,-9.5,-0.25,-0.5,-9.5,-0.25,0.5],
// 4 5 -10.58 -0.25 6.68 -11.08 -0.25 5.82 -8.48 -0.25 4.32 -7.98 -0.25 5.18
  [4,5,-10.58,-0.25,6.68,-11.08,-0.25,5.82,-8.48,-0.25,4.32,-7.98,-0.25,5.18],
// 4 5 -5.82 -0.25 11.08 -6.68 -0.25 10.58 -5.18 -0.25 7.98 -4.32 -0.25 8.48
  [4,5,-5.82,-0.25,11.08,-6.68,-0.25,10.58,-5.18,-0.25,7.98,-4.32,-0.25,8.48],
// 4 27 -1.6 -0.25 -1.2 -1.8 -0.25 -0.3 -2.7 -0.25 -0.7 -3 -0.25 -1.4
  [4,27,-1.6,-0.25,-1.2,-1.8,-0.25,-0.3,-2.7,-0.25,-0.7,-3,-0.25,-1.4],
// 4 27 -0.9 -0.25 -1.6 -1.6 -0.25 -1.2 -3 -0.25 -1.4 -1.4 -0.25 -2.1
  [4,27,-0.9,-0.25,-1.6,-1.6,-0.25,-1.2,-3,-0.25,-1.4,-1.4,-0.25,-2.1],
// 4 27 -2.2 -0.25 -2.3 -1.4 -0.25 -2.1 -3 -0.25 -1.4 -2.7 -0.25 -2
  [4,27,-2.2,-0.25,-2.3,-1.4,-0.25,-2.1,-3,-0.25,-1.4,-2.7,-0.25,-2],
// 4 27 1.5 -0.25 1.2 2 -0.25 0.4 6.8 -0.25 3.4 6.6 -0.25 3.7
  [4,27,1.5,-0.25,1.2,2,-0.25,0.4,6.8,-0.25,3.4,6.6,-0.25,3.7],
// 4 15 -0.5 -0.25 12.5 0 -0.25 14.25 -5.453475 -0.25 13.16558 -5.82 -0.25 11.08
  [4,15,-0.5,-0.25,12.5,0,-0.25,14.25,-5.453475,-0.25,13.16558,-5.82,-0.25,11.08],
// 4 15 -6.68 -0.25 10.58 -5.82 -0.25 11.08 -5.453475 -0.25 13.16558 -10.07618 -0.25 10.07618
  [4,15,-6.68,-0.25,10.58,-5.82,-0.25,11.08,-5.453475,-0.25,13.16558,-10.07618,-0.25,10.07618],
// 4 15 -10.58 -0.25 6.68 -6.68 -0.25 10.58 -10.07618 -0.25 10.07618 -13.16558 -0.25 5.453475
  [4,15,-10.58,-0.25,6.68,-6.68,-0.25,10.58,-10.07618,-0.25,10.07618,-13.16558,-0.25,5.453475],
// 3 15 -10.58 -0.25 6.68 -13.16558 -0.25 5.453475 -11.08 -0.25 5.82
  [3,15,-10.58,-0.25,6.68,-13.16558,-0.25,5.453475,-11.08,-0.25,5.82],
// 4 15 -12.5 -0.25 0.5 -11.08 -0.25 5.82 -13.16558 -0.25 5.453475 -14.25 -0.25 0
  [4,15,-12.5,-0.25,0.5,-11.08,-0.25,5.82,-13.16558,-0.25,5.453475,-14.25,-0.25,0],
// 4 15 -12.5 -0.25 -0.5 -12.5 -0.25 0.5 -14.25 -0.25 0 -13.16558 -0.25 -5.453475
  [4,15,-12.5,-0.25,-0.5,-12.5,-0.25,0.5,-14.25,-0.25,0,-13.16558,-0.25,-5.453475],
// 4 15 -12.5 -0.25 -0.5 -13.16558 -0.25 -5.453475 -11.08 -0.25 -5.82 -8.48 -0.25 -4.32
  [4,15,-12.5,-0.25,-0.5,-13.16558,-0.25,-5.453475,-11.08,-0.25,-5.82,-8.48,-0.25,-4.32],
// 4 15 -10.58 -0.25 -6.68 -11.08 -0.25 -5.82 -13.16558 -0.25 -5.453475 -10.07618 -0.25 -10.07618
  [4,15,-10.58,-0.25,-6.68,-11.08,-0.25,-5.82,-13.16558,-0.25,-5.453475,-10.07618,-0.25,-10.07618],
// 4 15 -6.68 -0.25 -10.58 -10.58 -0.25 -6.68 -10.07618 -0.25 -10.07618 -5.453475 -0.25 -13.16558
  [4,15,-6.68,-0.25,-10.58,-10.58,-0.25,-6.68,-10.07618,-0.25,-10.07618,-5.453475,-0.25,-13.16558],
// 3 15 -6.68 -0.25 -10.58 -5.453475 -0.25 -13.16558 -5.82 -0.25 -11.08
  [3,15,-6.68,-0.25,-10.58,-5.453475,-0.25,-13.16558,-5.82,-0.25,-11.08],
// 4 15 -0.5 -0.25 -12.5 -5.82 -0.25 -11.08 -5.453475 -0.25 -13.16558 0 -0.25 -14.25
  [4,15,-0.5,-0.25,-12.5,-5.82,-0.25,-11.08,-5.453475,-0.25,-13.16558,0,-0.25,-14.25],
// 4 15 0.5 -0.25 -12.5 -0.5 -0.25 -12.5 0 -0.25 -14.25 5.453475 -0.25 -13.16558
  [4,15,0.5,-0.25,-12.5,-0.5,-0.25,-12.5,0,-0.25,-14.25,5.453475,-0.25,-13.16558],
// 4 15 0.5 -0.25 -12.5 5.453475 -0.25 -13.16558 5.82 -0.25 -11.08 4.32 -0.25 -8.48
  [4,15,0.5,-0.25,-12.5,5.453475,-0.25,-13.16558,5.82,-0.25,-11.08,4.32,-0.25,-8.48],
// 4 15 6.68 -0.25 -10.58 5.82 -0.25 -11.08 5.453475 -0.25 -13.16558 10.07618 -0.25 -10.07618
  [4,15,6.68,-0.25,-10.58,5.82,-0.25,-11.08,5.453475,-0.25,-13.16558,10.07618,-0.25,-10.07618],
// 4 15 10.58 -0.25 -6.68 6.68 -0.25 -10.58 10.07618 -0.25 -10.07618 13.16558 -0.25 -5.453475
  [4,15,10.58,-0.25,-6.68,6.68,-0.25,-10.58,10.07618,-0.25,-10.07618,13.16558,-0.25,-5.453475],
// 3 15 13.16558 -0.25 -5.453475 11.08 -0.25 -5.82 10.58 -0.25 -6.68
  [3,15,13.16558,-0.25,-5.453475,11.08,-0.25,-5.82,10.58,-0.25,-6.68],
// 4 15 12.5 -0.25 -0.5 11.08 -0.25 -5.82 13.16558 -0.25 -5.453475 14.25 -0.25 0
  [4,15,12.5,-0.25,-0.5,11.08,-0.25,-5.82,13.16558,-0.25,-5.453475,14.25,-0.25,0],
// 4 15 12.5 -0.25 0.5 12.5 -0.25 -0.5 14.25 -0.25 0 13.16558 -0.25 5.453475
  [4,15,12.5,-0.25,0.5,12.5,-0.25,-0.5,14.25,-0.25,0,13.16558,-0.25,5.453475],
// 4 15 12.5 -0.25 0.5 13.16558 -0.25 5.453475 11.08 -0.25 5.82 8.48 -0.25 4.32
  [4,15,12.5,-0.25,0.5,13.16558,-0.25,5.453475,11.08,-0.25,5.82,8.48,-0.25,4.32],
// 4 15 10.58 -0.25 6.68 11.08 -0.25 5.82 13.16558 -0.25 5.453475 10.07618 -0.25 10.07618
  [4,15,10.58,-0.25,6.68,11.08,-0.25,5.82,13.16558,-0.25,5.453475,10.07618,-0.25,10.07618],
// 4 15 6.68 -0.25 10.58 10.58 -0.25 6.68 10.07618 -0.25 10.07618 5.453475 -0.25 13.16558
  [4,15,6.68,-0.25,10.58,10.58,-0.25,6.68,10.07618,-0.25,10.07618,5.453475,-0.25,13.16558],
// 3 15 5.453475 -0.25 13.16558 5.82 -0.25 11.08 6.68 -0.25 10.58
  [3,15,5.453475,-0.25,13.16558,5.82,-0.25,11.08,6.68,-0.25,10.58],
// 4 15 0.5 -0.25 12.5 5.82 -0.25 11.08 5.453475 -0.25 13.16558 0 -0.25 14.25
  [4,15,0.5,-0.25,12.5,5.82,-0.25,11.08,5.453475,-0.25,13.16558,0,-0.25,14.25],
// 3 15 0 -0.25 14.25 -0.5 -0.25 12.5 0.5 -0.25 12.5
  [3,15,0,-0.25,14.25,-0.5,-0.25,12.5,0.5,-0.25,12.5],
// 4 15 -0.5 -0.25 9.5 -0.5 -0.25 12.5 -5.82 -0.25 11.08 -4.32 -0.25 8.48
  [4,15,-0.5,-0.25,9.5,-0.5,-0.25,12.5,-5.82,-0.25,11.08,-4.32,-0.25,8.48],
// 4 15 0 -0.25 1.2 -0.5 -0.25 9.5 -4.32 -0.25 8.48 -1.2 -0.25 1.2
  [4,15,0,-0.25,1.2,-0.5,-0.25,9.5,-4.32,-0.25,8.48,-1.2,-0.25,1.2],
// 4 15 -1.2 -0.25 1.2 -4.32 -0.25 8.48 -5.18 -0.25 7.98 -7.98 -0.25 5.18
  [4,15,-1.2,-0.25,1.2,-4.32,-0.25,8.48,-5.18,-0.25,7.98,-7.98,-0.25,5.18],
// 4 15 -7.98 -0.25 5.18 -5.18 -0.25 7.98 -6.68 -0.25 10.58 -10.58 -0.25 6.68
  [4,15,-7.98,-0.25,5.18,-5.18,-0.25,7.98,-6.68,-0.25,10.58,-10.58,-0.25,6.68],
// 4 15 -1.2 -0.25 1.2 -7.98 -0.25 5.18 -8.48 -0.25 4.32 -1.2 -0.25 0
  [4,15,-1.2,-0.25,1.2,-7.98,-0.25,5.18,-8.48,-0.25,4.32,-1.2,-0.25,0],
// 4 15 -1.8 -0.25 -0.3 -1.2 -0.25 0 -8.48 -0.25 4.32 -9.5 -0.25 0.5
  [4,15,-1.8,-0.25,-0.3,-1.2,-0.25,0,-8.48,-0.25,4.32,-9.5,-0.25,0.5],
// 4 15 -9.5 -0.25 0.5 -8.48 -0.25 4.32 -11.08 -0.25 5.82 -12.5 -0.25 0.5
  [4,15,-9.5,-0.25,0.5,-8.48,-0.25,4.32,-11.08,-0.25,5.82,-12.5,-0.25,0.5],
// 4 15 -2.7 -0.25 -0.7 -1.8 -0.25 -0.3 -9.5 -0.25 0.5 -9.5 -0.25 -0.5
  [4,15,-2.7,-0.25,-0.7,-1.8,-0.25,-0.3,-9.5,-0.25,0.5,-9.5,-0.25,-0.5],
// 4 15 -3 -0.25 -1.4 -2.7 -0.25 -0.7 -9.5 -0.25 -0.5 -8.48 -0.25 -4.32
  [4,15,-3,-0.25,-1.4,-2.7,-0.25,-0.7,-9.5,-0.25,-0.5,-8.48,-0.25,-4.32],
// 3 15 -9.5 -0.25 -0.5 -12.5 -0.25 -0.5 -8.48 -0.25 -4.32
  [3,15,-9.5,-0.25,-0.5,-12.5,-0.25,-0.5,-8.48,-0.25,-4.32],
// 4 15 -2.7 -0.25 -2 -3 -0.25 -1.4 -8.48 -0.25 -4.32 -7.98 -0.25 -5.18
  [4,15,-2.7,-0.25,-2,-3,-0.25,-1.4,-8.48,-0.25,-4.32,-7.98,-0.25,-5.18],
// 4 15 -2.2 -0.25 -2.3 -2.7 -0.25 -2 -7.98 -0.25 -5.18 -5.18 -0.25 -7.98
  [4,15,-2.2,-0.25,-2.3,-2.7,-0.25,-2,-7.98,-0.25,-5.18,-5.18,-0.25,-7.98],
// 4 15 -5.18 -0.25 -7.98 -7.98 -0.25 -5.18 -10.58 -0.25 -6.68 -6.68 -0.25 -10.58
  [4,15,-5.18,-0.25,-7.98,-7.98,-0.25,-5.18,-10.58,-0.25,-6.68,-6.68,-0.25,-10.58],
// 4 15 -2.2 -0.25 -2.3 -5.18 -0.25 -7.98 -4.32 -0.25 -8.48 -0.5 -0.25 -9.5
  [4,15,-2.2,-0.25,-2.3,-5.18,-0.25,-7.98,-4.32,-0.25,-8.48,-0.5,-0.25,-9.5],
// 4 15 -0.5 -0.25 -9.5 -4.32 -0.25 -8.48 -5.82 -0.25 -11.08 -0.5 -0.25 -12.5
  [4,15,-0.5,-0.25,-9.5,-4.32,-0.25,-8.48,-5.82,-0.25,-11.08,-0.5,-0.25,-12.5],
// 4 15 -1.4 -0.25 -2.1 -2.2 -0.25 -2.3 -0.5 -0.25 -9.5 0.5 -0.25 -9.5
  [4,15,-1.4,-0.25,-2.1,-2.2,-0.25,-2.3,-0.5,-0.25,-9.5,0.5,-0.25,-9.5],
// 4 15 -1.4 -0.25 -2.1 0.5 -0.25 -9.5 4.32 -0.25 -8.48 -0.9 -0.25 -1.6
  [4,15,-1.4,-0.25,-2.1,0.5,-0.25,-9.5,4.32,-0.25,-8.48,-0.9,-0.25,-1.6],
// 3 15 4.32 -0.25 -8.48 0.5 -0.25 -9.5 0.5 -0.25 -12.5
  [3,15,4.32,-0.25,-8.48,0.5,-0.25,-9.5,0.5,-0.25,-12.5],
// 4 15 -0.9 -0.25 -1.6 4.32 -0.25 -8.48 5.18 -0.25 -7.98 0 -0.25 -1.2
  [4,15,-0.9,-0.25,-1.6,4.32,-0.25,-8.48,5.18,-0.25,-7.98,0,-0.25,-1.2],
// 3 15 0 -0.25 -1.2 -1.2 -0.25 -1.2 -0.9 -0.25 -1.6
  [3,15,0,-0.25,-1.2,-1.2,-0.25,-1.2,-0.9,-0.25,-1.6],
// 3 15 -1.2 -0.25 -1.2 -1.6 -0.25 -1.2 -0.9 -0.25 -1.6
  [3,15,-1.2,-0.25,-1.2,-1.6,-0.25,-1.2,-0.9,-0.25,-1.6],
// 4 15 -1.6 -0.25 -1.2 -1.2 -0.25 -1.2 -1.2 -0.25 0 -1.8 -0.25 -0.3
  [4,15,-1.6,-0.25,-1.2,-1.2,-0.25,-1.2,-1.2,-0.25,0,-1.8,-0.25,-0.3],
// 4 15 5.18 -0.25 -7.98 6.68 -0.25 -10.58 10.58 -0.25 -6.68 7.98 -0.25 -5.18
  [4,15,5.18,-0.25,-7.98,6.68,-0.25,-10.58,10.58,-0.25,-6.68,7.98,-0.25,-5.18],
// 4 15 0 -0.25 -1.2 5.18 -0.25 -7.98 7.98 -0.25 -5.18 1.2 -0.25 -1.2
  [4,15,0,-0.25,-1.2,5.18,-0.25,-7.98,7.98,-0.25,-5.18,1.2,-0.25,-1.2],
// 4 15 1.2 -0.25 -1.2 7.98 -0.25 -5.18 8.48 -0.25 -4.32 2 -0.25 0.4
  [4,15,1.2,-0.25,-1.2,7.98,-0.25,-5.18,8.48,-0.25,-4.32,2,-0.25,0.4],
// 4 15 9.5 -0.25 -0.5 2 -0.25 0.4 8.48 -0.25 -4.32 11.08 -0.25 -5.82
  [4,15,9.5,-0.25,-0.5,2,-0.25,0.4,8.48,-0.25,-4.32,11.08,-0.25,-5.82],
// 3 15 12.5 -0.25 -0.5 9.5 -0.25 -0.5 11.08 -0.25 -5.82
  [3,15,12.5,-0.25,-0.5,9.5,-0.25,-0.5,11.08,-0.25,-5.82],
// 4 15 2 -0.25 0.4 9.5 -0.25 -0.5 9.5 -0.25 0.5 6.8 -0.25 3.4
  [4,15,2,-0.25,0.4,9.5,-0.25,-0.5,9.5,-0.25,0.5,6.8,-0.25,3.4],
// 4 15 8.48 -0.25 4.32 6.8 -0.25 3.4 9.5 -0.25 0.5 12.5 -0.25 0.5
  [4,15,8.48,-0.25,4.32,6.8,-0.25,3.4,9.5,-0.25,0.5,12.5,-0.25,0.5],
// 4 15 6.8 -0.25 3.4 8.48 -0.25 4.32 7.98 -0.25 5.18 6.6 -0.25 3.7
  [4,15,6.8,-0.25,3.4,8.48,-0.25,4.32,7.98,-0.25,5.18,6.6,-0.25,3.7],
// 4 15 5.18 -0.25 7.98 6.6 -0.25 3.7 7.98 -0.25 5.18 6.68 -0.25 10.58
  [4,15,5.18,-0.25,7.98,6.6,-0.25,3.7,7.98,-0.25,5.18,6.68,-0.25,10.58],
// 3 15 6.68 -0.25 10.58 7.98 -0.25 5.18 10.58 -0.25 6.68
  [3,15,6.68,-0.25,10.58,7.98,-0.25,5.18,10.58,-0.25,6.68],
// 4 15 1.5 -0.25 1.2 6.6 -0.25 3.7 5.18 -0.25 7.98 1.2 -0.25 1.2
  [4,15,1.5,-0.25,1.2,6.6,-0.25,3.7,5.18,-0.25,7.98,1.2,-0.25,1.2],
// 4 15 2 -0.25 0.4 1.5 -0.25 1.2 1.2 -0.25 1.2 1.2 -0.25 0
  [4,15,2,-0.25,0.4,1.5,-0.25,1.2,1.2,-0.25,1.2,1.2,-0.25,0],
// 3 15 2 -0.25 0.4 1.2 -0.25 0 1.2 -0.25 -1.2
  [3,15,2,-0.25,0.4,1.2,-0.25,0,1.2,-0.25,-1.2],
// 4 15 1.2 -0.25 1.2 5.18 -0.25 7.98 4.32 -0.25 8.48 0 -0.25 1.2
  [4,15,1.2,-0.25,1.2,5.18,-0.25,7.98,4.32,-0.25,8.48,0,-0.25,1.2],
// 4 15 0.5 -0.25 9.5 0 -0.25 1.2 4.32 -0.25 8.48 5.82 -0.25 11.08
  [4,15,0.5,-0.25,9.5,0,-0.25,1.2,4.32,-0.25,8.48,5.82,-0.25,11.08],
// 3 15 0.5 -0.25 12.5 0.5 -0.25 9.5 5.82 -0.25 11.08
  [3,15,0.5,-0.25,12.5,0.5,-0.25,9.5,5.82,-0.25,11.08],
// 3 15 0.5 -0.25 9.5 -0.5 -0.25 9.5 0 -0.25 1.2
  [3,15,0.5,-0.25,9.5,-0.5,-0.25,9.5,0,-0.25,1.2],
];
module ldraw_lib__4650852m(step=0, col=false, unit=2/5, alt=false, line=0.2, solid=!$preview)
    makepoly(ldraw_lib__4650852m(), step=step, col=col, unit=unit, alt=alt, line=line, solid=solid);
ldraw_lib__4650852m(line=0.2);
